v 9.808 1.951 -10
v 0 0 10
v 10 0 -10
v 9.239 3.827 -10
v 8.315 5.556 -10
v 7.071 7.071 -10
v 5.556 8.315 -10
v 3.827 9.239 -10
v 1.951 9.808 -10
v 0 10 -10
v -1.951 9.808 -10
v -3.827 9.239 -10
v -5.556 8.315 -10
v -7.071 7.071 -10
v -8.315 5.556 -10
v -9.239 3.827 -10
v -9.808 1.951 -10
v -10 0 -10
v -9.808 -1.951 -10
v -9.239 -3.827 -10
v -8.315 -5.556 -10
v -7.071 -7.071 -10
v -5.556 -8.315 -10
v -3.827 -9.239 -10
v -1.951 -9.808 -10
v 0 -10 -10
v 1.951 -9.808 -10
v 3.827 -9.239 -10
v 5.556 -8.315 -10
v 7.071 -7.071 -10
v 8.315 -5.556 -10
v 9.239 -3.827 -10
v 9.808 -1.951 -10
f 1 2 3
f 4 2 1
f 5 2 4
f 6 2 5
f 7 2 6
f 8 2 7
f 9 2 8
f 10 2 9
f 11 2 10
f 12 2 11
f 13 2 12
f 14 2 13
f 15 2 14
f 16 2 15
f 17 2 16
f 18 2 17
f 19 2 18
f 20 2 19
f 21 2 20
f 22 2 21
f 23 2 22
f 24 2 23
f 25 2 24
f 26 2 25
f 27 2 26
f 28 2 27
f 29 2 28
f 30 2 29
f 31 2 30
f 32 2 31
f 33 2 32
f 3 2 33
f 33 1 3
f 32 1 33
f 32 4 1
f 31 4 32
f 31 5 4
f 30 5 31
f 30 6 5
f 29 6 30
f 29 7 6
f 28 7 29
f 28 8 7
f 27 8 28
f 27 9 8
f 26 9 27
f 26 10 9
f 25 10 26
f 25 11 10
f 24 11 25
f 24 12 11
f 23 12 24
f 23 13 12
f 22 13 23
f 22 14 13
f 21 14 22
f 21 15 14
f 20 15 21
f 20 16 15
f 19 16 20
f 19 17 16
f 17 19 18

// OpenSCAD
// ==================================================================
// VaultMind Forge - Smart Primitives Library
// ==================================================================
// Smart OpenSCAD modules with multi-mode, unit scaling, and presets
//
// Each primitive is a "smart object" that can be:
// - Multiple shape variations in one module
// - Unit-aware (mm/cm/m) with automatic scaling
// - Preset-based (traffic_cone, basketball, etc.)
// - Resolution-controlled (smoothness)
//

// ==================================================================
// CONE - Smart Cone Module
// ==================================================================
module cone_smart(
    radius=10,           // [1:100] base radius
    height=20,           // [1:100] cone height
    unit="mm",           // [mm:cm:m] unit selector
    mode="cone",         // [cone:traffic_cone:wizard_hat:ice_cream:party_hat:full] shape mode
    resolution=32        // [6:256] number of segments
) {
    // Unit conversion
    scale_unit = (unit=="mm") ? 1 : (unit=="cm") ? 10 : (unit=="m") ? 1000 : 1;
    r_scaled = radius * scale_unit;
    h_scaled = height * scale_unit;

    if (mode == "cone") {
        // Standard cone
        cylinder(h=h_scaled, r1=r_scaled, r2=0, center=true, $fn=resolution);
    }

    if (mode == "traffic_cone") {
        // Traffic cone preset
        r_cone = 30 * scale_unit;
        h_cone = 70 * scale_unit;
        cylinder(h=h_cone, r1=r_cone, r2=0, center=true, $fn=resolution);
    }

    if (mode == "wizard_hat") {
        // Tall wizard hat preset
        r_hat = 40 * scale_unit;
        h_hat = 120 * scale_unit;
        cylinder(h=h_hat, r1=r_hat, r2=0, center=true, $fn=resolution);
    }

    if (mode == "ice_cream") {
        // Ice cream cone preset (upside down)
        r_ice = 25 * scale_unit;
        h_ice = 60 * scale_unit;
        rotate([180, 0, 0])
            cylinder(h=h_ice, r1=r_ice, r2=0, center=true, $fn=resolution);
    }

    if (mode == "party_hat") {
        // Party hat preset (bright colored)
        r_party = 35 * scale_unit;
        h_party = 80 * scale_unit;
        cylinder(h=h_party, r1=r_party, r2=0, center=true, $fn=resolution);
    }

    if (mode == "full") {
        // Full double cone (diamond shape)
        union() {
            cylinder(h=h_scaled, r1=r_scaled, r2=0, center=false, $fn=resolution);
            rotate([180, 0, 0])
                cylinder(h=h_scaled, r1=r_scaled, r2=0, center=false, $fn=resolution);
        }
    }
}

// Default render
cone_smart(radius=10, height=20, mode="cone", resolution=32);


// ==================================================================
// TORUS - Smart Torus Module
// ==================================================================
module torus_smart(
    major_radius=20,     // [5:100] outer ring radius
    minor_radius=5,      // [1:50] tube thickness
    unit="mm",           // [mm:cm:m] unit selector
    mode="torus",        // [torus:donut:tire:ring:life_preserver:halo] shape mode
    major_res=48,        // [6:128] outer ring smoothness
    minor_res=24         // [6:128] tube smoothness
) {
    // Unit conversion
    scale_unit = (unit=="mm") ? 1 : (unit=="cm") ? 10 : (unit=="m") ? 1000 : 1;
    maj_r = major_radius * scale_unit;
    min_r = minor_radius * scale_unit;

    if (mode == "torus") {
        // Standard torus
        rotate_extrude($fn=major_res)
            translate([maj_r, 0, 0])
                circle(r=min_r, $fn=minor_res);
    }

    if (mode == "donut") {
        // Food donut preset
        maj = 50 * scale_unit;
        min = 15 * scale_unit;
        rotate_extrude($fn=48)
            translate([maj, 0, 0])
                circle(r=min, $fn=24);
    }

    if (mode == "tire") {
        // Car tire preset
        maj = 100 * scale_unit;
        min = 20 * scale_unit;
        rotate_extrude($fn=64)
            translate([maj, 0, 0])
                circle(r=min, $fn=32);
    }

    if (mode == "ring") {
        // Jewelry ring preset
        maj = 8 * scale_unit;
        min = 1 * scale_unit;
        rotate_extrude($fn=64)
            translate([maj, 0, 0])
                circle(r=min, $fn=16);
    }

    if (mode == "life_preserver") {
        // Life preserver preset
        maj = 150 * scale_unit;
        min = 30 * scale_unit;
        rotate_extrude($fn=48)
            translate([maj, 0, 0])
                circle(r=min, $fn=24);
    }

    if (mode == "halo") {
        // Angel halo preset (thin ring)
        maj = 40 * scale_unit;
        min = 3 * scale_unit;
        rotate_extrude($fn=64)
            translate([maj, 0, 0])
                circle(r=min, $fn=16);
    }
}

// Default render (commented to avoid conflict)
// torus_smart(major_radius=20, minor_radius=5, mode="torus");


// ==================================================================
// CAPSULE - Smart Capsule Module
// ==================================================================
module capsule_smart(
    radius=5,            // [1:50] capsule thickness
    height=20,           // [1:100] capsule length
    unit="mm",           // [mm:cm:m] unit selector
    mode="capsule",      // [capsule:pill:bullet:rolling_pin:test_tube] shape mode
    resolution=32        // [6:128] smoothness
) {
    // Unit conversion
    scale_unit = (unit=="mm") ? 1 : (unit=="cm") ? 10 : (unit=="m") ? 1000 : 1;
    r_scaled = radius * scale_unit;
    h_scaled = height * scale_unit;

    if (mode == "capsule") {
        // Standard capsule
        union() {
            cylinder(h=h_scaled, r=r_scaled, center=true, $fn=resolution);
            translate([0, 0, h_scaled/2])
                sphere(r=r_scaled, $fn=resolution);
            translate([0, 0, -h_scaled/2])
                sphere(r=r_scaled, $fn=resolution);
        }
    }

    if (mode == "pill") {
        // Medicine pill preset
        r_pill = 3 * scale_unit;
        h_pill = 10 * scale_unit;
        union() {
            cylinder(h=h_pill, r=r_pill, center=true, $fn=32);
            translate([0, 0, h_pill/2])
                sphere(r=r_pill, $fn=32);
            translate([0, 0, -h_pill/2])
                sphere(r=r_pill, $fn=32);
        }
    }

    if (mode == "bullet") {
        // Bullet preset
        r_bullet = 4 * scale_unit;
        h_bullet = 15 * scale_unit;
        union() {
            cylinder(h=h_bullet, r=r_bullet, center=true, $fn=32);
            translate([0, 0, h_bullet/2])
                sphere(r=r_bullet, $fn=32);
            translate([0, 0, -h_bullet/2])
                sphere(r=r_bullet, $fn=32);
        }
    }

    if (mode == "rolling_pin") {
        // Rolling pin preset
        r_pin = 15 * scale_unit;
        h_pin = 80 * scale_unit;
        union() {
            cylinder(h=h_pin, r=r_pin, center=true, $fn=48);
            translate([0, 0, h_pin/2])
                sphere(r=r_pin, $fn=48);
            translate([0, 0, -h_pin/2])
                sphere(r=r_pin, $fn=48);
        }
    }

    if (mode == "test_tube") {
        // Test tube preset
        r_tube = 6 * scale_unit;
        h_tube = 40 * scale_unit;
        union() {
            cylinder(h=h_tube, r=r_tube, center=true, $fn=32);
            translate([0, 0, h_tube/2])
                sphere(r=r_tube, $fn=32);
        }
    }
}

// Default render (commented)
// capsule_smart(radius=5, height=20, mode="capsule");


// ==================================================================
// TUBE - Smart Tube Module (Hollow Cylinder)
// ==================================================================
module tube_smart(
    outer_radius=15,     // [2:100] outer radius
    inner_radius=10,     // [1:99] inner radius
    height=30,           // [1:200] tube height
    unit="mm",           // [mm:cm:m] unit selector
    mode="tube",         // [tube:pipe:straw:chimney:tunnel] shape mode
    resolution=48        // [6:128] smoothness
) {
    // Unit conversion
    scale_unit = (unit=="mm") ? 1 : (unit=="cm") ? 10 : (unit=="m") ? 1000 : 1;
    r_out = outer_radius * scale_unit;
    r_in = inner_radius * scale_unit;
    h_scaled = height * scale_unit;

    if (mode == "tube") {
        // Standard tube
        difference() {
            cylinder(h=h_scaled, r=r_out, center=true, $fn=resolution);
            cylinder(h=h_scaled+1, r=r_in, center=true, $fn=resolution);
        }
    }

    if (mode == "pipe") {
        // Metal pipe preset
        r_out_pipe = 20 * scale_unit;
        r_in_pipe = 17 * scale_unit;
        h_pipe = 100 * scale_unit;
        difference() {
            cylinder(h=h_pipe, r=r_out_pipe, center=true, $fn=64);
            cylinder(h=h_pipe+1, r=r_in_pipe, center=true, $fn=64);
        }
    }

    if (mode == "straw") {
        // Drinking straw preset
        r_out_straw = 3 * scale_unit;
        r_in_straw = 2.5 * scale_unit;
        h_straw = 150 * scale_unit;
        difference() {
            cylinder(h=h_straw, r=r_out_straw, center=true, $fn=32);
            cylinder(h=h_straw+1, r=r_in_straw, center=true, $fn=32);
        }
    }

    if (mode == "chimney") {
        // Chimney preset
        r_out_chim = 50 * scale_unit;
        r_in_chim = 45 * scale_unit;
        h_chim = 200 * scale_unit;
        difference() {
            cylinder(h=h_chim, r=r_out_chim, center=true, $fn=48);
            cylinder(h=h_chim+1, r=r_in_chim, center=true, $fn=48);
        }
    }

    if (mode == "tunnel") {
        // Tunnel preset (rotated)
        r_out_tunnel = 100 * scale_unit;
        r_in_tunnel = 90 * scale_unit;
        h_tunnel = 500 * scale_unit;
        rotate([90, 0, 0])
            difference() {
                cylinder(h=h_tunnel, r=r_out_tunnel, center=true, $fn=64);
                cylinder(h=h_tunnel+1, r=r_in_tunnel, center=true, $fn=64);
            }
    }
}

// Default render (commented)
// tube_smart(outer_radius=15, inner_radius=10, height=30, mode="tube");


// ==================================================================
// DOME - Smart Dome Module (Hemisphere)
// ==================================================================
module dome_smart(
    radius=20,           // [1:100] dome radius
    unit="mm",           // [mm:cm:m] unit selector
    mode="dome",         // [dome:helmet:igloo:half_ball:observatory] shape mode
    resolution=64        // [6:256] smoothness
) {
    // Unit conversion
    scale_unit = (unit=="mm") ? 1 : (unit=="cm") ? 10 : (unit=="m") ? 1000 : 1;
    r_scaled = radius * scale_unit;

    if (mode == "dome") {
        // Standard dome (half sphere)
        difference() {
            sphere(r=r_scaled, $fn=resolution);
            translate([0, 0, -r_scaled])
                cube([r_scaled*2+1, r_scaled*2+1, r_scaled*2], center=true);
        }
    }

    if (mode == "helmet") {
        // Helmet preset
        r_helmet = 100 * scale_unit;
        difference() {
            sphere(r=r_helmet, $fn=64);
            translate([0, 0, -r_helmet])
                cube([r_helmet*2+1, r_helmet*2+1, r_helmet*2], center=true);
        }
    }

    if (mode == "igloo") {
        // Igloo preset
        r_igloo = 150 * scale_unit;
        difference() {
            sphere(r=r_igloo, $fn=48);
            translate([0, 0, -r_igloo])
                cube([r_igloo*2+1, r_igloo*2+1, r_igloo*2], center=true);
        }
    }

    if (mode == "half_ball") {
        // Half ball preset
        r_ball = 50 * scale_unit;
        difference() {
            sphere(r=r_ball, $fn=64);
            translate([0, 0, -r_ball])
                cube([r_ball*2+1, r_ball*2+1, r_ball*2], center=true);
        }
    }

    if (mode == "observatory") {
        // Observatory dome preset
        r_obs = 500 * scale_unit;
        difference() {
            sphere(r=r_obs, $fn=128);
            translate([0, 0, -r_obs])
                cube([r_obs*2+1, r_obs*2+1, r_obs*2], center=true);
        }
    }
}

// Default render (commented)
// dome_smart(radius=20, mode="dome");


// ==================================================================
// RING - Smart Ring Module (Flat Torus)
// ==================================================================
module ring_smart(
    outer_radius=20,     // [2:100] outer radius
    inner_radius=15,     // [1:99] inner radius
    thickness=2,         // [0.1:20] ring thickness
    unit="mm",           // [mm:cm:m] unit selector
    mode="ring",         // [ring:coin:washer:gasket:frame] shape mode
    resolution=64        // [6:256] smoothness
) {
    // Unit conversion
    scale_unit = (unit=="mm") ? 1 : (unit=="cm") ? 10 : (unit=="m") ? 1000 : 1;
    r_out = outer_radius * scale_unit;
    r_in = inner_radius * scale_unit;
    t_scaled = thickness * scale_unit;

    if (mode == "ring") {
        // Standard ring
        linear_extrude(height=t_scaled, center=true)
            difference() {
                circle(r=r_out, $fn=resolution);
                circle(r=r_in, $fn=resolution);
            }
    }

    if (mode == "coin") {
        // Coin preset
        r_out_coin = 25 * scale_unit;
        r_in_coin = 0 * scale_unit;
        t_coin = 2 * scale_unit;
        linear_extrude(height=t_coin, center=true)
            difference() {
                circle(r=r_out_coin, $fn=64);
                circle(r=r_in_coin, $fn=64);
            }
    }

    if (mode == "washer") {
        // Washer preset
        r_out_wash = 15 * scale_unit;
        r_in_wash = 8 * scale_unit;
        t_wash = 2 * scale_unit;
        linear_extrude(height=t_wash, center=true)
            difference() {
                circle(r=r_out_wash, $fn=48);
                circle(r=r_in_wash, $fn=48);
            }
    }

    if (mode == "gasket") {
        // Gasket preset
        r_out_gas = 50 * scale_unit;
        r_in_gas = 45 * scale_unit;
        t_gas = 3 * scale_unit;
        linear_extrude(height=t_gas, center=true)
            difference() {
                circle(r=r_out_gas, $fn=64);
                circle(r=r_in_gas, $fn=64);
            }
    }

    if (mode == "frame") {
        // Picture frame preset
        r_out_frame = 100 * scale_unit;
        r_in_frame = 80 * scale_unit;
        t_frame = 10 * scale_unit;
        linear_extrude(height=t_frame, center=true)
            difference() {
                circle(r=r_out_frame, $fn=64);
                circle(r=r_in_frame, $fn=64);
            }
    }
}

// Default render (commented)
// ring_smart(outer_radius=20, inner_radius=15, thickness=2, mode="ring");


// ==================================================================
// PYRAMID - Smart Pyramid Module
// ==================================================================
module pyramid_smart(
    base_size=20,        // [1:100] base size
    height=30,           // [1:100] pyramid height
    sides=4,             // [3:8] number of sides
    unit="mm",           // [mm:cm:m] unit selector
    mode="pyramid",      // [pyramid:egyptian:tent:obelisk:spike] shape mode
    resolution=1         // [1:4] subdivision level
) {
    // Unit conversion
    scale_unit = (unit=="mm") ? 1 : (unit=="cm") ? 10 : (unit=="m") ? 1000 : 1;
    b_scaled = base_size * scale_unit;
    h_scaled = height * scale_unit;

    if (mode == "pyramid") {
        // Standard pyramid
        cylinder(h=h_scaled, r1=b_scaled/2, r2=0, center=true, $fn=sides);
    }

    if (mode == "egyptian") {
        // Egyptian pyramid preset (4-sided, specific ratio)
        b_egypt = 100 * scale_unit;
        h_egypt = 75 * scale_unit;
        cylinder(h=h_egypt, r1=b_egypt/2, r2=0, center=true, $fn=4);
    }

    if (mode == "tent") {
        // Tent preset (4-sided, low profile)
        b_tent = 100 * scale_unit;
        h_tent = 50 * scale_unit;
        cylinder(h=h_tent, r1=b_tent/2, r2=0, center=true, $fn=4);
    }

    if (mode == "obelisk") {
        // Obelisk preset (4-sided, tall)
        b_obelisk = 20 * scale_unit;
        h_obelisk = 150 * scale_unit;
        cylinder(h=h_obelisk, r1=b_obelisk/2, r2=0, center=true, $fn=4);
    }

    if (mode == "spike") {
        // Spike preset (many sides, sharp)
        b_spike = 10 * scale_unit;
        h_spike = 40 * scale_unit;
        cylinder(h=h_spike, r1=b_spike/2, r2=0, center=true, $fn=16);
    }
}

// Default render (commented)
// pyramid_smart(base_size=20, height=30, sides=4, mode="pyramid");


// ==================================================================
// Example Usages (Uncomment to test)
// ==================================================================

// CONE EXAMPLES
// cone_smart(radius=30, height=70, mode="traffic_cone", unit="mm");
// cone_smart(radius=40, height=120, mode="wizard_hat", unit="mm");
// cone_smart(radius=10, height=20, mode="cone", resolution=64);

// TORUS EXAMPLES
// torus_smart(major_radius=50, minor_radius=15, mode="donut", unit="mm");
// torus_smart(major_radius=100, minor_radius=20, mode="tire", unit="mm");
// torus_smart(major_radius=8, minor_radius=1, mode="ring", unit="mm");

// CAPSULE EXAMPLES
// capsule_smart(radius=3, height=10, mode="pill", unit="mm");
// capsule_smart(radius=4, height=15, mode="bullet", unit="mm");
// capsule_smart(radius=15, height=80, mode="rolling_pin", unit="mm");

// TUBE EXAMPLES
// tube_smart(outer_radius=20, inner_radius=17, height=100, mode="pipe", unit="mm");
// tube_smart(outer_radius=3, inner_radius=2.5, height=150, mode="straw", unit="mm");

// DOME EXAMPLES
// dome_smart(radius=100, mode="helmet", unit="mm");
// dome_smart(radius=150, mode="igloo", unit="mm");

// RING EXAMPLES
// ring_smart(outer_radius=25, inner_radius=0, thickness=2, mode="coin", unit="mm");
// ring_smart(outer_radius=15, inner_radius=8, thickness=2, mode="washer", unit="mm");

// PYRAMID EXAMPLES
// pyramid_smart(base_size=100, height=75, sides=4, mode="egyptian", unit="mm");
// pyramid_smart(base_size=100, height=50, sides=4, mode="tent", unit="mm");
